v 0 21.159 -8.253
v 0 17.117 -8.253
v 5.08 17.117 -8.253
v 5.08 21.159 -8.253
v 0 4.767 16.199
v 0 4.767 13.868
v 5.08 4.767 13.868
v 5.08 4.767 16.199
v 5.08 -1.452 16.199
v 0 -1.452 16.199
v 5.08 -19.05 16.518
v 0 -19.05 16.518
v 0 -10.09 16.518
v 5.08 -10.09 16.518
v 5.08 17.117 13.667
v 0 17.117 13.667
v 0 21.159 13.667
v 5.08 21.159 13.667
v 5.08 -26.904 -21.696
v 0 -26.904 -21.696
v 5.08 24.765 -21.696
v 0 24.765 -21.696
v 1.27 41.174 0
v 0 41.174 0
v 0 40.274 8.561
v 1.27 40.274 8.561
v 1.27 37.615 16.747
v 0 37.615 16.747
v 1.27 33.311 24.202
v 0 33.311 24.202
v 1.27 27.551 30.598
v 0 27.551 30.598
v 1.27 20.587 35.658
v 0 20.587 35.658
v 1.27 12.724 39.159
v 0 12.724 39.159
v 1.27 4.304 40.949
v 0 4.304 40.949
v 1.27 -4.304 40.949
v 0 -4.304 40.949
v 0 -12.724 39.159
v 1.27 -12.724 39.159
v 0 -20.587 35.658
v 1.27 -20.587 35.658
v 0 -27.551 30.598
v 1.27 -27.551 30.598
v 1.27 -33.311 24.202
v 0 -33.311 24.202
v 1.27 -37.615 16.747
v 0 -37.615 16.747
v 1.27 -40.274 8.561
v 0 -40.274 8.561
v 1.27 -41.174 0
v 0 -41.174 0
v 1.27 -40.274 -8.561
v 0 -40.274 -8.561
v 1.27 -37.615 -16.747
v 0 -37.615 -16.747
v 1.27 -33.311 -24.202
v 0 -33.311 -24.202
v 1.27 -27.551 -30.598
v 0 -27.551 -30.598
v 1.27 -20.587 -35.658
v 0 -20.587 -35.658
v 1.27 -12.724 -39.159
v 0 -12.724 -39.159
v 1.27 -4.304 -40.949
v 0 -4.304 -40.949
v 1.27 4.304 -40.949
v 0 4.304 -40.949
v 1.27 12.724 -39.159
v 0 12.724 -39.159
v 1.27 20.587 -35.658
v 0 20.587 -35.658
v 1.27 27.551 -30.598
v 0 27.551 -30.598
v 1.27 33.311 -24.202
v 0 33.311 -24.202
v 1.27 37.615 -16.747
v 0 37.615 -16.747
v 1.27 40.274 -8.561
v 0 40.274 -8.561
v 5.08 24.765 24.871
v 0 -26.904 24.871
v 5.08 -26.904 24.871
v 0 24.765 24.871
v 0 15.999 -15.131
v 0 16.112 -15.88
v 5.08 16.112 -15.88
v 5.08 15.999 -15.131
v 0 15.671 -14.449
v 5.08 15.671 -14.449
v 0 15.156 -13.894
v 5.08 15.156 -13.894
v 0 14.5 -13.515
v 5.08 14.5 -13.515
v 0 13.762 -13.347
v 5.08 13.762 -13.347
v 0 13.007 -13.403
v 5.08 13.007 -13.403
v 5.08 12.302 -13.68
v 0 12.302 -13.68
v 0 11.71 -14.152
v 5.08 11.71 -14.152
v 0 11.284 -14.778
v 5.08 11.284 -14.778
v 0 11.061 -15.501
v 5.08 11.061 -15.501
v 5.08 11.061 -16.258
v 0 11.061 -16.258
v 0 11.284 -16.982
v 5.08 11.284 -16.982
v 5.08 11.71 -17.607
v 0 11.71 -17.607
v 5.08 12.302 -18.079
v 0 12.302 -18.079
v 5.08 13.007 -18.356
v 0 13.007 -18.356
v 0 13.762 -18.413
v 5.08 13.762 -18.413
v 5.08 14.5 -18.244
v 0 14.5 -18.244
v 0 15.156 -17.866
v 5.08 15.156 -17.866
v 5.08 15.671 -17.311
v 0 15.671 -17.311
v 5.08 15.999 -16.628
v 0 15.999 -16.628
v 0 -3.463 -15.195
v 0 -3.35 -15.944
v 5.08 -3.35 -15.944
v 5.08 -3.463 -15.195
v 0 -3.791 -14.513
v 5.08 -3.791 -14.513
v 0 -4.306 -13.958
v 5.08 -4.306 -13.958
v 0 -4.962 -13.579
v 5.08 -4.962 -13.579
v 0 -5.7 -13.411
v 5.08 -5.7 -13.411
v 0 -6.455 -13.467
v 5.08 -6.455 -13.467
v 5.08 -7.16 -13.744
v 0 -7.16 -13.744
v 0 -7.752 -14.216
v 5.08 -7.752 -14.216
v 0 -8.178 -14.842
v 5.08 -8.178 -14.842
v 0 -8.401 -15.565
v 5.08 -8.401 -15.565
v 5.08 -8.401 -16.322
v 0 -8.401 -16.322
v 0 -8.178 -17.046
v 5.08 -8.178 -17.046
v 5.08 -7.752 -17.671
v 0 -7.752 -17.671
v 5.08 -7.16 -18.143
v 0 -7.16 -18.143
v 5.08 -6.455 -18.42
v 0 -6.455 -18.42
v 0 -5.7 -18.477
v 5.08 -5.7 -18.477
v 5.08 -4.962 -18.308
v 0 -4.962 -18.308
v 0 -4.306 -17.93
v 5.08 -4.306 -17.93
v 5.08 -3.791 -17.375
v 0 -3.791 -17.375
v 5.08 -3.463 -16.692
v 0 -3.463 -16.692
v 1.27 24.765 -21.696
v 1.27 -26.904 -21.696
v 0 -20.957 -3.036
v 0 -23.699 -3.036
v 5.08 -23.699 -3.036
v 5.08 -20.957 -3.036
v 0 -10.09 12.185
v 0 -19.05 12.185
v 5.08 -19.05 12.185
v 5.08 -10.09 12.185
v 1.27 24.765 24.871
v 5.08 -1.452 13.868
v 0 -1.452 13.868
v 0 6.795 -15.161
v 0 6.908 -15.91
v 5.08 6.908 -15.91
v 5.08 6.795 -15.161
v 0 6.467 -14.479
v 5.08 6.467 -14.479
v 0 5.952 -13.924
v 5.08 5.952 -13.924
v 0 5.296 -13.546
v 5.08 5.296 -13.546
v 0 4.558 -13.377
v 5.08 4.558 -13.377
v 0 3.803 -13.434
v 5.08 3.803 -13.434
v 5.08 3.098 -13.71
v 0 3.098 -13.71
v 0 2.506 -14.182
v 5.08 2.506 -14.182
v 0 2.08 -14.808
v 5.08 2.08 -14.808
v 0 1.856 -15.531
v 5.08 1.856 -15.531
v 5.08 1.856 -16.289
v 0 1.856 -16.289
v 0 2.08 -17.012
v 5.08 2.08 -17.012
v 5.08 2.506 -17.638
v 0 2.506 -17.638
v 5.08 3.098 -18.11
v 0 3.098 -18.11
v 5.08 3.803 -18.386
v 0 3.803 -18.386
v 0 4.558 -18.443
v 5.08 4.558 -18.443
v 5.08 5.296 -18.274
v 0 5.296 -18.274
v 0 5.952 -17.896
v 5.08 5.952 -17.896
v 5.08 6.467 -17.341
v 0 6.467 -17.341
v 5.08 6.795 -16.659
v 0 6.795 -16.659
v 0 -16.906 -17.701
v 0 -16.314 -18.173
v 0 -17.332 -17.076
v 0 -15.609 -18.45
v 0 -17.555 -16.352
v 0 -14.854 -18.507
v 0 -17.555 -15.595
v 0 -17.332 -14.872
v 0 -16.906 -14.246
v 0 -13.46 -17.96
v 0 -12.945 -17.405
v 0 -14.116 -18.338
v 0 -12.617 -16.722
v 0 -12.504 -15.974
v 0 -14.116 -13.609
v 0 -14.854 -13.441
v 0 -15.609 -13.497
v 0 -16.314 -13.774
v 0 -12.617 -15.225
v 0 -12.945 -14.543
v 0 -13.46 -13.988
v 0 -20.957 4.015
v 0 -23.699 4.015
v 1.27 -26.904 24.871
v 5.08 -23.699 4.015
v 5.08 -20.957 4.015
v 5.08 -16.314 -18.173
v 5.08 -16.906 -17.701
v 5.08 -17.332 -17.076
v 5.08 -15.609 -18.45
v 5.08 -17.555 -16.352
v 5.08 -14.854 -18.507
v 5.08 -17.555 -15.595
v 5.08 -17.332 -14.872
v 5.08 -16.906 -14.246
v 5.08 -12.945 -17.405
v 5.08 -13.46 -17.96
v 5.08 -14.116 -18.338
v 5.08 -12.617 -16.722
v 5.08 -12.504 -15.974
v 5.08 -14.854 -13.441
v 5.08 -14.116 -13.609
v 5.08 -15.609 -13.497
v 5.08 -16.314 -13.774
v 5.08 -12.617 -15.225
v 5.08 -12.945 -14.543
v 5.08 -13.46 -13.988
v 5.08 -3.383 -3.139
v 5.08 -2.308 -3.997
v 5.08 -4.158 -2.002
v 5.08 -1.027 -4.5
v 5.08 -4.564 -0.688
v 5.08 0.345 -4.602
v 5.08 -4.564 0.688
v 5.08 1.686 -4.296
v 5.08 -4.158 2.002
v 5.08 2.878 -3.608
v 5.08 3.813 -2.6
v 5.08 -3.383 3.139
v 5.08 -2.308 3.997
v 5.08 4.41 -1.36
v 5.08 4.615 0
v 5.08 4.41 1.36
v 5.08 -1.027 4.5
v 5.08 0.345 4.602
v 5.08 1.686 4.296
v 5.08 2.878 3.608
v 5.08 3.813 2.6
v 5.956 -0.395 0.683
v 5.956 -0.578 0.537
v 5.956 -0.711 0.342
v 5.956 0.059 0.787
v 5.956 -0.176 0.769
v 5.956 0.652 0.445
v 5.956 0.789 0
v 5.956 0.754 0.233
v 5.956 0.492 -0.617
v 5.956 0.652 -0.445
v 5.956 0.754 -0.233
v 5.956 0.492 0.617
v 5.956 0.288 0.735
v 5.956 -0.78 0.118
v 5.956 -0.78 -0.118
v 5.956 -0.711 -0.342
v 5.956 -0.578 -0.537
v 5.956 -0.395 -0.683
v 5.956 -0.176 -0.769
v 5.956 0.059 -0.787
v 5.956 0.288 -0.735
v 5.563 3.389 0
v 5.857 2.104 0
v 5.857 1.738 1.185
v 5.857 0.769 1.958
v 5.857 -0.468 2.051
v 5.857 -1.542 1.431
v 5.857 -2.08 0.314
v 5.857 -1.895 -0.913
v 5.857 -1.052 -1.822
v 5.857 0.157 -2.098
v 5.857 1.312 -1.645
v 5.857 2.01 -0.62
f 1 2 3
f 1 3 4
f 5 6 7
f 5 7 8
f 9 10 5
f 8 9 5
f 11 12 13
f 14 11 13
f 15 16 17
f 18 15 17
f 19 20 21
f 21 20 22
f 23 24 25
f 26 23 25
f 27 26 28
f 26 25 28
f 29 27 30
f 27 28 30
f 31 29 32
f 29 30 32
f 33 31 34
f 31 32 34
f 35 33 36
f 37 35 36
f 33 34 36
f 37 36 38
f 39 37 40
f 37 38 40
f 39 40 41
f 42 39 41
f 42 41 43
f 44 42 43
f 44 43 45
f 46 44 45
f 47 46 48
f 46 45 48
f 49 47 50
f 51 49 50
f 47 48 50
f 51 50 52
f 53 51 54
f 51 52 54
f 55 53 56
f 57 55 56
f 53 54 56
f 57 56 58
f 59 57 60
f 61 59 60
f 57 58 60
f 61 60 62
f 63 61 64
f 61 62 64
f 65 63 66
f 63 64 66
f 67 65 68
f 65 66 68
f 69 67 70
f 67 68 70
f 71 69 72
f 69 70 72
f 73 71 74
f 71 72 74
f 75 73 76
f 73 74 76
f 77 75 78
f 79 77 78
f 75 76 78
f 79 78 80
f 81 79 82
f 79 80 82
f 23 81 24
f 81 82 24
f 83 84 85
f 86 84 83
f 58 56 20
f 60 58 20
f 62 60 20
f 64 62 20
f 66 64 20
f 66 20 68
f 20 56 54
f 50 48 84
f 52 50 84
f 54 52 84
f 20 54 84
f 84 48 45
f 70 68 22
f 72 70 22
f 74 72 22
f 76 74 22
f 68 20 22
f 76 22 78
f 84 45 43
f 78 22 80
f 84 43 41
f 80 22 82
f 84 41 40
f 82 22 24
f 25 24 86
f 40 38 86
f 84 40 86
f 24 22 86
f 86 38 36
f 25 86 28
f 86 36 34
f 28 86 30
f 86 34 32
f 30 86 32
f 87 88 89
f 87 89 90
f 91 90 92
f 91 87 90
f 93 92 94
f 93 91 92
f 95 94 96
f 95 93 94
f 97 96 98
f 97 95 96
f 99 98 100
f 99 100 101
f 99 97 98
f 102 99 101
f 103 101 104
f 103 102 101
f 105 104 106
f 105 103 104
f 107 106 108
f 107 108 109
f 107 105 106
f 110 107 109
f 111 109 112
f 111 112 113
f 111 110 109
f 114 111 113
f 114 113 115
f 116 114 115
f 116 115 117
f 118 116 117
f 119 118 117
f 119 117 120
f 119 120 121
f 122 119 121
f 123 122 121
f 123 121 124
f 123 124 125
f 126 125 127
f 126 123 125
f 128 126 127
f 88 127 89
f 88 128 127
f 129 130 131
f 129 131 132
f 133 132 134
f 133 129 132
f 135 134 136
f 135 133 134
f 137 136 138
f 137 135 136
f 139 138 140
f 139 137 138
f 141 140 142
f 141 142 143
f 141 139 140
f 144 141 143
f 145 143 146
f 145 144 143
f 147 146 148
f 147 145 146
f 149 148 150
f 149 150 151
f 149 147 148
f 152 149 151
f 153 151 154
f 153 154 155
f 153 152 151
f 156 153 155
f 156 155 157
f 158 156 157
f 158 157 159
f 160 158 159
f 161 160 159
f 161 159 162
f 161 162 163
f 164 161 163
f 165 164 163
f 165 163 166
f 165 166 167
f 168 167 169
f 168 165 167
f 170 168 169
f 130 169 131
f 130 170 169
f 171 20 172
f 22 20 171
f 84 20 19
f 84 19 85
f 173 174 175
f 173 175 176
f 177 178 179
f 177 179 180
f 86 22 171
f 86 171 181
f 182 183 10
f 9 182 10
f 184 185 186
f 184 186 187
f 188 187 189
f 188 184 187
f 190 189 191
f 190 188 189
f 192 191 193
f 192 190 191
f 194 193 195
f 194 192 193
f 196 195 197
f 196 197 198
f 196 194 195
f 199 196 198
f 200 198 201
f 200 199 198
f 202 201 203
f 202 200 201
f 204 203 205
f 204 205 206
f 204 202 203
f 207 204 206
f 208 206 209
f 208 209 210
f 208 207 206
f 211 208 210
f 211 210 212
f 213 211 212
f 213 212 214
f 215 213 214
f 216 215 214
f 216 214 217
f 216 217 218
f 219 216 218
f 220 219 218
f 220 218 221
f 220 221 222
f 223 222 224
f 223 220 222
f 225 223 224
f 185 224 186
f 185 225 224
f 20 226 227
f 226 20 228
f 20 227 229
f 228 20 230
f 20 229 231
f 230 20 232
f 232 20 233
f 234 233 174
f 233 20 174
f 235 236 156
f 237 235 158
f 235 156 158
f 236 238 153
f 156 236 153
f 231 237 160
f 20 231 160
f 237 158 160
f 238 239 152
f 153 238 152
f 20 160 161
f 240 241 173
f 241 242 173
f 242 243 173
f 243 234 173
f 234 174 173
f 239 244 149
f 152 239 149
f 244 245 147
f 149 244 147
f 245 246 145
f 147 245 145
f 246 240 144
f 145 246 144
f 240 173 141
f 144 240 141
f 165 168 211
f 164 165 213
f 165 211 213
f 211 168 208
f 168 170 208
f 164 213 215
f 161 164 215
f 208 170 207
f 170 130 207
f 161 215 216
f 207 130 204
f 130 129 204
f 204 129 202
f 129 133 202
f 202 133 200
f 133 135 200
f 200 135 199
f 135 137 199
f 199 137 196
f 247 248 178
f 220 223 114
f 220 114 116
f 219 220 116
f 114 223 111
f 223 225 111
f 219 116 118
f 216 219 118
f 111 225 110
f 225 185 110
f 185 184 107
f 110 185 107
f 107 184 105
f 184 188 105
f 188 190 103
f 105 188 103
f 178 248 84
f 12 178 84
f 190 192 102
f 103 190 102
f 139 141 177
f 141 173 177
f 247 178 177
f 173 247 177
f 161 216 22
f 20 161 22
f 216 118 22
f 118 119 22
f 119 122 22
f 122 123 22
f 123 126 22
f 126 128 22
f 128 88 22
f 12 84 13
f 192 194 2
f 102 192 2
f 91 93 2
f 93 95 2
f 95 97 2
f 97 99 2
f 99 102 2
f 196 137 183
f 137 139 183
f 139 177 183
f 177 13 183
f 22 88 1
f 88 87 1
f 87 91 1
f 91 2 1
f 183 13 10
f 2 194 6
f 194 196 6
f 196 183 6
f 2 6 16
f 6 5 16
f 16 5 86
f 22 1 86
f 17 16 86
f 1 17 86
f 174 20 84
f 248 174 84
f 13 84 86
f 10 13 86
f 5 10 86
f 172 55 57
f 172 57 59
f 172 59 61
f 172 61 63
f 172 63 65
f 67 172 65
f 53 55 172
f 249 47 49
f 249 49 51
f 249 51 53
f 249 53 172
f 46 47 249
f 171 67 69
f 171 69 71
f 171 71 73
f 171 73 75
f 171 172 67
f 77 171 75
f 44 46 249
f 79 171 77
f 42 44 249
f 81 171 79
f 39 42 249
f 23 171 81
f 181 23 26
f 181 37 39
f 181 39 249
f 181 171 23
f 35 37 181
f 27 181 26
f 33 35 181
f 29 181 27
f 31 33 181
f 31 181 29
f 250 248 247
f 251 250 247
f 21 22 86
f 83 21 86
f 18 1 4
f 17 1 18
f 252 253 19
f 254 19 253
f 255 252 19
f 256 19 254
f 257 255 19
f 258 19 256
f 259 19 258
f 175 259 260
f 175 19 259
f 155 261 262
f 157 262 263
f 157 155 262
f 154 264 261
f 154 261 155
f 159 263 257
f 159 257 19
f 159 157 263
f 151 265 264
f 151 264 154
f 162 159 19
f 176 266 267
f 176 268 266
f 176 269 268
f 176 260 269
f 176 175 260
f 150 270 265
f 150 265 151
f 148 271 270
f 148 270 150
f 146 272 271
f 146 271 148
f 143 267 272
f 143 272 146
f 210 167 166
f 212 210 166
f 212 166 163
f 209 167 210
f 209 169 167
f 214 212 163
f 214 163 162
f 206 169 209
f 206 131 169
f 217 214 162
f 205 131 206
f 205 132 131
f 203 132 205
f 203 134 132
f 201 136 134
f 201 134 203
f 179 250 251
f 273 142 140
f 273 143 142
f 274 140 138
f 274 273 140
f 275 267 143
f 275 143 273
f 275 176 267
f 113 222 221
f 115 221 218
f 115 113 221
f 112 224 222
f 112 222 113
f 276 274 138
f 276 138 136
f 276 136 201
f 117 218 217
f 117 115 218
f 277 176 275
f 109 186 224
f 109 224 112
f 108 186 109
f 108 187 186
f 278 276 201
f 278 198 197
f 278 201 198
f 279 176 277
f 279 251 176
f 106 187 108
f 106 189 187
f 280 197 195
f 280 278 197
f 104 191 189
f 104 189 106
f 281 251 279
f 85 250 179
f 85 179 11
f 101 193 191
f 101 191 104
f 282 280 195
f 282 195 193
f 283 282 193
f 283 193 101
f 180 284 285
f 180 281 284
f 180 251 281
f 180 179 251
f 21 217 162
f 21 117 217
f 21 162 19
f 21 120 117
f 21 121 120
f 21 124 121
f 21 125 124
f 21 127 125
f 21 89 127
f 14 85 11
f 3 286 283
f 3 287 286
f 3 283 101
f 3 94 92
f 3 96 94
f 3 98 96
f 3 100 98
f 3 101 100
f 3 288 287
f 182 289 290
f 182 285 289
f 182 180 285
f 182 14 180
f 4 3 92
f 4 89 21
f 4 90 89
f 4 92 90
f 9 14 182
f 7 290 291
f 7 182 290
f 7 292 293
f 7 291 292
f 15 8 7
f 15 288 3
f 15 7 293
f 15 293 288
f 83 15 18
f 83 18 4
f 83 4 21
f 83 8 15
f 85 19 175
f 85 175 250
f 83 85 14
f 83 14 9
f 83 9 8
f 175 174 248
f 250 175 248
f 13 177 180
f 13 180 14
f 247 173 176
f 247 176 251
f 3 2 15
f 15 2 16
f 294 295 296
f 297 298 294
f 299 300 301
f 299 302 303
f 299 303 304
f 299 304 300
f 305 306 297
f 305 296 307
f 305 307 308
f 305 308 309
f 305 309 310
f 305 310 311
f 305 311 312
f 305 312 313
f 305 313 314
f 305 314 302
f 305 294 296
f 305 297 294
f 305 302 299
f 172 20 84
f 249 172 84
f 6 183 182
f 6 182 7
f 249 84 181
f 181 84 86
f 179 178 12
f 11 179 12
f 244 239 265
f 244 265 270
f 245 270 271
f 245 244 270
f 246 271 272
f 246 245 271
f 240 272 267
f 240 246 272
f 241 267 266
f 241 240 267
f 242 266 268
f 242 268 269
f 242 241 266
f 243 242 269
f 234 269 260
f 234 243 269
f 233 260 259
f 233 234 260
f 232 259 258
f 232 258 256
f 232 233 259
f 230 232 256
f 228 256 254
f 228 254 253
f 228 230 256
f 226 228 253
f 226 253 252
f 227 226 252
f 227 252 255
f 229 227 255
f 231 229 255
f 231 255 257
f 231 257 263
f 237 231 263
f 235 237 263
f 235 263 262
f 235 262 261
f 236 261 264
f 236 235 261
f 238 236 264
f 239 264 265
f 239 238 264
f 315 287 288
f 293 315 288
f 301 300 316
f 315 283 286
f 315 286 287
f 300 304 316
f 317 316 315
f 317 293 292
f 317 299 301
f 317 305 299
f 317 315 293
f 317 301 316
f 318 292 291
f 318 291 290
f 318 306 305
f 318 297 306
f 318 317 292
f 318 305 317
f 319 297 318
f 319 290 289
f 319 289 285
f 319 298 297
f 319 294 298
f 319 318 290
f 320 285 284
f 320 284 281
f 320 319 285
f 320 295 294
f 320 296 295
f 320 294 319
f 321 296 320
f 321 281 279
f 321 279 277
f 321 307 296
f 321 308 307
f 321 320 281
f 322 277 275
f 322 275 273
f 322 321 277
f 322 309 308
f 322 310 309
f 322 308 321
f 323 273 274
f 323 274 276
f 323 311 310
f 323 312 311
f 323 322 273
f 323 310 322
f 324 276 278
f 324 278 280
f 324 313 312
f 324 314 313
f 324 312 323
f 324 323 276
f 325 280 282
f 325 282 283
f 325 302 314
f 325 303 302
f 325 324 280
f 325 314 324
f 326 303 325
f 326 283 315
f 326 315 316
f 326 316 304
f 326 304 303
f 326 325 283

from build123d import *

# Parameters (mm, degrees)
F0_W      = 51.6687010021
F0_H      = 46.5666760604
F0_R      = 2.54
F0_W_2    = 2.7420800179
F0_H_2    = 7.0510646328
F0_W_3    = 8.9598344539
F0_H_3    = 4.3325314605
F0_R_2    = 4.6152632683
F0_W_4    = 4.0421821177
F0_H_4    = 21.9193678349
F0_W_5    = 6.2187388539
F0_H_5    = 2.331847325
F7_DEPTH  = 5.08
F8_DEPTH  = 5.95595
F0_R_3    = 41.1742131812
F10_DEPTH = 1.27


# Not quite as in the source:
# - a fillet or chamfer that OpenCascade refuses, or shapes differently, is made with other operations: its cross-section is extruded or revolved along the edge and cut away or added
# - the program builds the solid bodies; features that only make, move or delete a surface that nothing else refers to are left out


with BuildPart() as f7:
    # F0 (on Right) → F7 (new body)
    with BuildSketch(Plane.YZ):
        with Locations((-1.069343959, 1.5875007549)):
            Rectangle(F0_W, F0_H)
        with Locations((-15.0437285019, -15.973794371)):
            Circle(F0_R, mode=Mode.SUBTRACT)
        with Locations((-5.8897222223, -15.9437051803)):
            Circle(F0_R, mode=Mode.SUBTRACT)
        with Locations((4.3680206165, -15.9099880108)):
            Circle(F0_R, mode=Mode.SUBTRACT)
        with Locations((13.5722881269, -15.8797336116)):
            Circle(F0_R, mode=Mode.SUBTRACT)
        with Locations((-22.3283721134, 0.4896570463)):
            Rectangle(F0_W_2, F0_H_2, mode=Mode.SUBTRACT)
        with Locations((-14.5700857925, 14.3513671276)):
            Rectangle(F0_W_3, F0_H_3, mode=Mode.SUBTRACT)
        Circle(F0_R_2, mode=Mode.SUBTRACT)
        with Locations((19.1379059106, 2.7070390061)):
            Rectangle(F0_W_4, F0_H_4, mode=Mode.SUBTRACT)
        with Locations((1.6578678042, 15.0334504433)):
            Rectangle(F0_W_5, F0_H_5, mode=Mode.SUBTRACT)
    extrude(amount=F7_DEPTH)

    # F0 (on Right) → F8 (join)
    with BuildSketch(Plane.YZ):
        Circle(F0_R_2)
    extrude(amount=F8_DEPTH)

    # F9: fillet of radius 8.7940626066 on 1 edges, made by hand

    # F9_s1 → F9_t2 (revolve, cut)
    with BuildSketch(Plane.XY):
        with BuildLine():
            ThreePointArc((5.08, 4.6152632683), (5.7341658279, 2.7517089067), (5.95595, 0.7891647492))
            Line((5.95595, 0.7891647492), (5.95595, 4.6152632683))
            Line((5.95595, 4.6152632683), (5.08, 4.6152632683))
        make_face()
    revolve(axis=Axis((5.95595, 0, 0), (1, 0, 0)), mode=Mode.SUBTRACT)


with BuildPart() as f10:
    # F0 (on Right) → F10 (new body)
    with BuildSketch(Plane.YZ):
        Circle(F0_R_3)
        with Locations((-1.069343959, 1.5875007549)):
            Rectangle(F0_W, F0_H, mode=Mode.SUBTRACT)
    extrude(amount=F10_DEPTH)


solid = Compound([f7.part, f10.part])
